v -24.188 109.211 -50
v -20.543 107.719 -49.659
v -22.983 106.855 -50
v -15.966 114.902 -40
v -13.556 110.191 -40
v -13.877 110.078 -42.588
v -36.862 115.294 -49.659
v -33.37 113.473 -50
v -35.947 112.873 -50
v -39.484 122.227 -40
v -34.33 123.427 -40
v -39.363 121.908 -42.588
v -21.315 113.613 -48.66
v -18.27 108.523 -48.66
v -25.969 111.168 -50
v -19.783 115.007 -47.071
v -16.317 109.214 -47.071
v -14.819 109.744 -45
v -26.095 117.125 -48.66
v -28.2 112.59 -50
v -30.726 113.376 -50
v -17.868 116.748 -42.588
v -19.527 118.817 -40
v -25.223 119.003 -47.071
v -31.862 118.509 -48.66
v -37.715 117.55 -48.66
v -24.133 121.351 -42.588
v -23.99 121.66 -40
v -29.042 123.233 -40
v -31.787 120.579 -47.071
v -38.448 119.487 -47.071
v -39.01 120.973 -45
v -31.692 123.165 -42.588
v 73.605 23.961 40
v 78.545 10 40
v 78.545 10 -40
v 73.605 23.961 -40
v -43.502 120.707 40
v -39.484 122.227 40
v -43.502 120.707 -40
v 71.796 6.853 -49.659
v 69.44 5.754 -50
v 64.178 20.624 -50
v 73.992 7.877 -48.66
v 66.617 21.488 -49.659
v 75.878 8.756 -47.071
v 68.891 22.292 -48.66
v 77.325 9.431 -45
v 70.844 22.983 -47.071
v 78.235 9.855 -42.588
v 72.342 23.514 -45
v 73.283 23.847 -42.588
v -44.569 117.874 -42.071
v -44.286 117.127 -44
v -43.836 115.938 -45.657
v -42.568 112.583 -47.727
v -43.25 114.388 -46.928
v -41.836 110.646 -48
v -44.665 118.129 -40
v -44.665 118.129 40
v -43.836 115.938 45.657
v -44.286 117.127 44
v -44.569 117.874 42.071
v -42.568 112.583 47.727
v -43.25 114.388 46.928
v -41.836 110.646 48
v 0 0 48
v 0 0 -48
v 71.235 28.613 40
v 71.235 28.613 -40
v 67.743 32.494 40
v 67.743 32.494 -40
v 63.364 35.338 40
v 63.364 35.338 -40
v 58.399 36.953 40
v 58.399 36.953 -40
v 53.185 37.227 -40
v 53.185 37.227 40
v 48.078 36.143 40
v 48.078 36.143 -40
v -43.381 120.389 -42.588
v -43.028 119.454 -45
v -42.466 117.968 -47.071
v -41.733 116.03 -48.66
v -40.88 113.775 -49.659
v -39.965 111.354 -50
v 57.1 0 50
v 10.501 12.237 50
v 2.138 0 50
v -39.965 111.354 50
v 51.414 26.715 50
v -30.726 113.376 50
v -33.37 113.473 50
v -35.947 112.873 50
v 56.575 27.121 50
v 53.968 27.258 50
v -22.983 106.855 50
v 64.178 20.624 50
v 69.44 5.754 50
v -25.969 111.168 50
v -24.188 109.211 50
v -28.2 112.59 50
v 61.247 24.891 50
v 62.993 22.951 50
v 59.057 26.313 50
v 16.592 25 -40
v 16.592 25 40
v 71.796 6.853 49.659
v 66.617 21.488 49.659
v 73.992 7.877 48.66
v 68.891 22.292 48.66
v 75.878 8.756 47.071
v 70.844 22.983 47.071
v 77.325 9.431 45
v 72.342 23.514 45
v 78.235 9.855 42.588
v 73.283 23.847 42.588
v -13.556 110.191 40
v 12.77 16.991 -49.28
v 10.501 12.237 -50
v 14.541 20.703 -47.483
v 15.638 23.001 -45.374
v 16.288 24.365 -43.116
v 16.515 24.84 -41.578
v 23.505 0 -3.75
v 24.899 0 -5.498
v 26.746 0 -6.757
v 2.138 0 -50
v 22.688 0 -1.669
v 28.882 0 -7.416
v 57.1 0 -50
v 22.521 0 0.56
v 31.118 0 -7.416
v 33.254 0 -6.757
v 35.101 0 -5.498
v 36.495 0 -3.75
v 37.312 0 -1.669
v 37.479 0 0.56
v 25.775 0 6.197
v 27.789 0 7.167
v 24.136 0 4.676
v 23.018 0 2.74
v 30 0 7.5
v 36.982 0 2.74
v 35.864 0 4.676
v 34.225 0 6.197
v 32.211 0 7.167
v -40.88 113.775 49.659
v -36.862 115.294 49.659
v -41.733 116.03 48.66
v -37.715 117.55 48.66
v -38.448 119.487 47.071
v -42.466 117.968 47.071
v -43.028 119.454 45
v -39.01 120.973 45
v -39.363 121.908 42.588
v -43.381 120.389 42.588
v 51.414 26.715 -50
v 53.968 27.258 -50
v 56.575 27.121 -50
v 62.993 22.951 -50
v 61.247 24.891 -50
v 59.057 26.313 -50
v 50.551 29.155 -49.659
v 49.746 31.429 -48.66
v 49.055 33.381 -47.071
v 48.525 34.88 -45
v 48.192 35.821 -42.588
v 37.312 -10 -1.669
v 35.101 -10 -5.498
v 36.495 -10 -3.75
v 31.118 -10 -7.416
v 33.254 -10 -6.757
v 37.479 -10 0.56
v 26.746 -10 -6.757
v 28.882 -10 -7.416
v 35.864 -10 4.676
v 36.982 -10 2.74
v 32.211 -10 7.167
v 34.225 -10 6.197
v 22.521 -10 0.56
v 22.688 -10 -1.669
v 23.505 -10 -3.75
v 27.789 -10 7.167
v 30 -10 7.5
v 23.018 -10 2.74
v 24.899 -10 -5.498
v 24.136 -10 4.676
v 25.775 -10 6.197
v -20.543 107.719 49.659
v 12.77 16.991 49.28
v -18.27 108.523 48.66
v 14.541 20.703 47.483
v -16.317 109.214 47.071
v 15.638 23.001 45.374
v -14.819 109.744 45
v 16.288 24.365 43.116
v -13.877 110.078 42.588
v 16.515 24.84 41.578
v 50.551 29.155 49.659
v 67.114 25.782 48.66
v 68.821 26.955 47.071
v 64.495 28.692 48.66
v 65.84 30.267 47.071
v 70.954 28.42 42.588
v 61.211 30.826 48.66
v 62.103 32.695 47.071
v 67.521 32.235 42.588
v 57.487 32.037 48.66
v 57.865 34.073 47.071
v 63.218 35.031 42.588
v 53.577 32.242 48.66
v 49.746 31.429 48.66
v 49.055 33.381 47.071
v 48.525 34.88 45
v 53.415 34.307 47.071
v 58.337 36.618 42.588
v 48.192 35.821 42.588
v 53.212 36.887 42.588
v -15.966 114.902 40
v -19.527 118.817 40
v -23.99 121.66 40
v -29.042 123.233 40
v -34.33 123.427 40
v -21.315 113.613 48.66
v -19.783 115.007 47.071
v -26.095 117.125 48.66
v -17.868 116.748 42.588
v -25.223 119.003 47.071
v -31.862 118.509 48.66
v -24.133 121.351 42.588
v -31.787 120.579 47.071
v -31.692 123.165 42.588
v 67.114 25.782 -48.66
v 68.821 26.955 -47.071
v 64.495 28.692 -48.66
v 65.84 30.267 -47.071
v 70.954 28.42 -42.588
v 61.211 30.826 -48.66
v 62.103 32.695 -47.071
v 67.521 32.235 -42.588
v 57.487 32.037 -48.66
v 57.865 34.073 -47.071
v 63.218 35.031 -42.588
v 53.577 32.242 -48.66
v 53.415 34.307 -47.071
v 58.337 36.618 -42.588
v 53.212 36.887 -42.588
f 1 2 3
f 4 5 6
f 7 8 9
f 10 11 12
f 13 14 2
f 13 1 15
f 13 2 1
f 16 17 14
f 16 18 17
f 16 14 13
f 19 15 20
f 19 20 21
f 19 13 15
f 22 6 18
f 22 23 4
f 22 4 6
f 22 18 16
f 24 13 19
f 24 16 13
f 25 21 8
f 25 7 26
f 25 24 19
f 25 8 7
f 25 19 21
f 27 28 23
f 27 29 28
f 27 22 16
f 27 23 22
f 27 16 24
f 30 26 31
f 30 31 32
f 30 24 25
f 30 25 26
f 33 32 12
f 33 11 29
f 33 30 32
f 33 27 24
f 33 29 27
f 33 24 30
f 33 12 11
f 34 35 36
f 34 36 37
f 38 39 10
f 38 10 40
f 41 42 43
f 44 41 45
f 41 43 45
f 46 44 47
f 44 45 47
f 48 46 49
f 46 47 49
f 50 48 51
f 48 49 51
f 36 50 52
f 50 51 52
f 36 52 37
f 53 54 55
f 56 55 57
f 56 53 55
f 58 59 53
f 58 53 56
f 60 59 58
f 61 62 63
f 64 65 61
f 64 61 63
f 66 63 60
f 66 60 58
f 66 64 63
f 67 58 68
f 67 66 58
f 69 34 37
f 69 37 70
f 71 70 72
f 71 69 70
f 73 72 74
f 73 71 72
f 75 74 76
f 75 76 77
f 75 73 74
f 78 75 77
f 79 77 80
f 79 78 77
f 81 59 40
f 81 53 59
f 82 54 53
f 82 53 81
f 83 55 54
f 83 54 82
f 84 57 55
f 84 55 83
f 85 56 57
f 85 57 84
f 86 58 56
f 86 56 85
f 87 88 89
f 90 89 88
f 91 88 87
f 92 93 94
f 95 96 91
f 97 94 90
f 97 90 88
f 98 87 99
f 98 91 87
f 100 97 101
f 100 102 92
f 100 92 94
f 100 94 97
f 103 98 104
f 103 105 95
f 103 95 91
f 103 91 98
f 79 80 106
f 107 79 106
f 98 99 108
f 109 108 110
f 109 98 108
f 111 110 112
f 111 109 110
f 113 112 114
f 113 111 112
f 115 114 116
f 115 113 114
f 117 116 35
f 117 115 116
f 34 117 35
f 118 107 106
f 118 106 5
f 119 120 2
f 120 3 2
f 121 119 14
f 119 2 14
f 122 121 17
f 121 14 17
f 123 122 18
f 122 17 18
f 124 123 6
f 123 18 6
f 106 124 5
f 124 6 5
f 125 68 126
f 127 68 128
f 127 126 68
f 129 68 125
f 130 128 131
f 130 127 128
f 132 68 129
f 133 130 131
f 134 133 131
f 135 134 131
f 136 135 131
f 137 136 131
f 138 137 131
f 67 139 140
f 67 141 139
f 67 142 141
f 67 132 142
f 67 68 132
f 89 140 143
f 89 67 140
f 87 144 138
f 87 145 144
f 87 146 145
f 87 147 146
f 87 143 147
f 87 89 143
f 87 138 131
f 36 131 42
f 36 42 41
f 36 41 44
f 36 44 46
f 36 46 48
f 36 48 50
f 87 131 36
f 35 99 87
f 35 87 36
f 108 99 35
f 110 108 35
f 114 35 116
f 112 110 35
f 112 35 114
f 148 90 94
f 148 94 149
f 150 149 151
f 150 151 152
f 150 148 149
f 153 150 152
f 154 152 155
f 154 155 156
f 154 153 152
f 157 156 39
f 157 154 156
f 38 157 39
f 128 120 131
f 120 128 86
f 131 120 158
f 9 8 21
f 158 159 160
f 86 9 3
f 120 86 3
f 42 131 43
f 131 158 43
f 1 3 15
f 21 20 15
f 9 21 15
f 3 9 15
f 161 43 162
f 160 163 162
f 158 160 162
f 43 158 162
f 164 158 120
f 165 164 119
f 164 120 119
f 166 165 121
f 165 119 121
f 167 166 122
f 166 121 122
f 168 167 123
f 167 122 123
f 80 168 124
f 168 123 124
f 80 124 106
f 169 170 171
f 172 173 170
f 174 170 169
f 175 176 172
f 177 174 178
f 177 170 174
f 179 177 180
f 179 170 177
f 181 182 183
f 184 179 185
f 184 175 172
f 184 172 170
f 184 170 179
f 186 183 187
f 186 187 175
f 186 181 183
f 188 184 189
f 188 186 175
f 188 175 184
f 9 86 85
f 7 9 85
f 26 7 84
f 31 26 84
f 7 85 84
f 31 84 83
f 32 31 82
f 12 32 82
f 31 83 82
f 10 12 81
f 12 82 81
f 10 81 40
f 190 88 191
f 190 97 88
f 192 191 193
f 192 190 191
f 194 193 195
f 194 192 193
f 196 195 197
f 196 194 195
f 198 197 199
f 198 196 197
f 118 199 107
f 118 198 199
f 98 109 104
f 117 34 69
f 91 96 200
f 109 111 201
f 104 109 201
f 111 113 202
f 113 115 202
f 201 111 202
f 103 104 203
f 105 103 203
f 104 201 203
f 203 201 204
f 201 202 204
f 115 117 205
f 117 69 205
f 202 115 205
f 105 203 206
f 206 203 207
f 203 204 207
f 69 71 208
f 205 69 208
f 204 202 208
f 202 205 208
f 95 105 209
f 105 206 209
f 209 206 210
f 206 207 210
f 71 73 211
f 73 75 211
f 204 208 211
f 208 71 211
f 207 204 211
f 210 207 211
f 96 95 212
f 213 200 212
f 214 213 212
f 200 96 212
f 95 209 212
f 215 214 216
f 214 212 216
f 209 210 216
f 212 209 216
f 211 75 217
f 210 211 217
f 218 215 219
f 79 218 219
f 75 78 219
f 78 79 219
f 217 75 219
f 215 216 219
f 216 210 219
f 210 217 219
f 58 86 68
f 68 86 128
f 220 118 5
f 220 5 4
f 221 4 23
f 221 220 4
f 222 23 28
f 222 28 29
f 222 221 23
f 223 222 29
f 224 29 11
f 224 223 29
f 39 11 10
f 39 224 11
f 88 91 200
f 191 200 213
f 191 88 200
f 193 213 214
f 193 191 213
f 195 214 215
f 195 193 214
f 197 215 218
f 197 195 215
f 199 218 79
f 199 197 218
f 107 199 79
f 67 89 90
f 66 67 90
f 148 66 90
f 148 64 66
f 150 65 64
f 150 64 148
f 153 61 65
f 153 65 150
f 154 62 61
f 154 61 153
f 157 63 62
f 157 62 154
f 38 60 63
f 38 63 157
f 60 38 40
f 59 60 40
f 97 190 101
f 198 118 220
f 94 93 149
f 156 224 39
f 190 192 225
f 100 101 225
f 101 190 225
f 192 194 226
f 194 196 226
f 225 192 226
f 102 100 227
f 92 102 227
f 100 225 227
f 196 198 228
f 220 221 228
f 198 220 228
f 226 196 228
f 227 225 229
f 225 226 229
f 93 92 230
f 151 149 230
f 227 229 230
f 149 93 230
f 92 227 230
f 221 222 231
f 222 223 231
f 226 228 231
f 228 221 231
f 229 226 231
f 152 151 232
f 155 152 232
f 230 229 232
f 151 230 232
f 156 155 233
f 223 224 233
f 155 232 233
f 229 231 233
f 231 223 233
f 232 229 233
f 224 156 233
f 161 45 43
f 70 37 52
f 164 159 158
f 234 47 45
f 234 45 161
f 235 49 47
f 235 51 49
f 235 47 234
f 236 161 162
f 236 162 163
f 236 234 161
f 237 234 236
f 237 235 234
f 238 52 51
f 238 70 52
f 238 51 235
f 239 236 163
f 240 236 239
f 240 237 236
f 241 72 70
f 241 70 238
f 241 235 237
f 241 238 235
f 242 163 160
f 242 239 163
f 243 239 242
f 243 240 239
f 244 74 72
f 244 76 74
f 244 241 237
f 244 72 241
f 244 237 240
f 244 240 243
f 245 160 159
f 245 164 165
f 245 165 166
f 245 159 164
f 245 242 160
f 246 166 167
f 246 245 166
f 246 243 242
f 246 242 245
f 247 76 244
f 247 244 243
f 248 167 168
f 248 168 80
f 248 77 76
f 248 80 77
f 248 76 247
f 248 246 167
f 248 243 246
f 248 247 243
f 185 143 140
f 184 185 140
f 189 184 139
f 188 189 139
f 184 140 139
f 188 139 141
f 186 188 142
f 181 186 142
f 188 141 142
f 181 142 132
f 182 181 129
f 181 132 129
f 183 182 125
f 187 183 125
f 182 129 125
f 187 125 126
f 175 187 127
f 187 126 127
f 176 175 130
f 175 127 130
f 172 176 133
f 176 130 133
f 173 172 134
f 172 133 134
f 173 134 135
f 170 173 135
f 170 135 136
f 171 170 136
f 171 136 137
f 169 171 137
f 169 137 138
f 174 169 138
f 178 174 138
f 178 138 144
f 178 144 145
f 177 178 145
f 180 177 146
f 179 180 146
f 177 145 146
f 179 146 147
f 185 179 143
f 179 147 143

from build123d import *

# Parameters (mm, degrees)
Y_KSEKLIK_EKSTR_ZYON1_DEPTH = 50
IZIM2_R                     = 7.5
Y_KSEKLIK_EKSTR_ZYON2_DEPTH = 10
RADYUS1_R                   = 10
PAH1_SIZE                   = 2


with BuildPart() as part:
    # Çizim1 → Yükseklik-Ekstrüzyon1 (new, symmetric)
    with BuildSketch(Plane.XY):
        with BuildLine():
            Line((-45.372360711, 120), (0, 0))
            Line((0, 0), (57.1, 0))
            Line((57.1, 0), (78.545069205, 10))
            Line((78.545069205, 10), (73.604661371, 23.960547839))
            ThreePointArc((73.604661371, 23.960547839), (63.364429783, 35.33825552), (48.078238331, 36.14257258))
            Line((48.078238331, 36.14257258), (16.591684434, 25))
            Line((16.591684434, 25), (-13.556112922, 110.191300263))
            ThreePointArc((-13.556112922, 110.191300263), (-23.989587023, 121.659965839), (-39.483672218, 122.22653082))
            Line((-39.483672218, 122.22653082), (-45.372360711, 120))
        make_face()
    extrude(amount=Y_KSEKLIK_EKSTR_ZYON1_DEPTH, both=True)

    # Çizim2 → Yükseklik-Ekstrüzyon2 (add)
    with BuildSketch(Plane.XZ):
        with Locations(Location((30, 0, 0), (0, 0, 90))):
            Circle(IZIM2_R)
    extrude(amount=Y_KSEKLIK_EKSTR_ZYON2_DEPTH)

    # Radyus1
    radyus1_edges = [part.edges().sort_by_distance(p)[0] for p in [
        (76.074865288, 16.980273919, -50),
        (-42.428016465, 121.11326541, -50),
        (76.074865288, 16.980273919, 50),
        (63.364429783, 35.33825552, 50),
        (32.334961383, 30.57128629, 50),
        (1.517785756, 67.595650131, 50),
        (-23.989587023, 121.659965839, 50),
        (-42.428016465, 121.11326541, 50),
        (-23.989587023, 121.659965839, -50),
        (1.517785756, 67.595650131, -50),
        (32.334961383, 30.57128629, -50),
        (63.364429783, 35.33825552, -50),
    ]]
    fillet(radyus1_edges, radius=RADYUS1_R)

    # Pah1
    pah1_edges = [part.edges().sort_by_distance(p)[0] for p in [
        (-20.917846504, 55.323142573, -50),
        (-20.917846504, 55.323142573, 50),
        (-45.372360711, 120, 0),
        (-44.336494724, 117.260360349, 47.071067812),
        (-44.336494724, 117.260360349, -47.071067812),
    ]]
    chamfer(pah1_edges, length=PAH1_SIZE)


solid = part.part
